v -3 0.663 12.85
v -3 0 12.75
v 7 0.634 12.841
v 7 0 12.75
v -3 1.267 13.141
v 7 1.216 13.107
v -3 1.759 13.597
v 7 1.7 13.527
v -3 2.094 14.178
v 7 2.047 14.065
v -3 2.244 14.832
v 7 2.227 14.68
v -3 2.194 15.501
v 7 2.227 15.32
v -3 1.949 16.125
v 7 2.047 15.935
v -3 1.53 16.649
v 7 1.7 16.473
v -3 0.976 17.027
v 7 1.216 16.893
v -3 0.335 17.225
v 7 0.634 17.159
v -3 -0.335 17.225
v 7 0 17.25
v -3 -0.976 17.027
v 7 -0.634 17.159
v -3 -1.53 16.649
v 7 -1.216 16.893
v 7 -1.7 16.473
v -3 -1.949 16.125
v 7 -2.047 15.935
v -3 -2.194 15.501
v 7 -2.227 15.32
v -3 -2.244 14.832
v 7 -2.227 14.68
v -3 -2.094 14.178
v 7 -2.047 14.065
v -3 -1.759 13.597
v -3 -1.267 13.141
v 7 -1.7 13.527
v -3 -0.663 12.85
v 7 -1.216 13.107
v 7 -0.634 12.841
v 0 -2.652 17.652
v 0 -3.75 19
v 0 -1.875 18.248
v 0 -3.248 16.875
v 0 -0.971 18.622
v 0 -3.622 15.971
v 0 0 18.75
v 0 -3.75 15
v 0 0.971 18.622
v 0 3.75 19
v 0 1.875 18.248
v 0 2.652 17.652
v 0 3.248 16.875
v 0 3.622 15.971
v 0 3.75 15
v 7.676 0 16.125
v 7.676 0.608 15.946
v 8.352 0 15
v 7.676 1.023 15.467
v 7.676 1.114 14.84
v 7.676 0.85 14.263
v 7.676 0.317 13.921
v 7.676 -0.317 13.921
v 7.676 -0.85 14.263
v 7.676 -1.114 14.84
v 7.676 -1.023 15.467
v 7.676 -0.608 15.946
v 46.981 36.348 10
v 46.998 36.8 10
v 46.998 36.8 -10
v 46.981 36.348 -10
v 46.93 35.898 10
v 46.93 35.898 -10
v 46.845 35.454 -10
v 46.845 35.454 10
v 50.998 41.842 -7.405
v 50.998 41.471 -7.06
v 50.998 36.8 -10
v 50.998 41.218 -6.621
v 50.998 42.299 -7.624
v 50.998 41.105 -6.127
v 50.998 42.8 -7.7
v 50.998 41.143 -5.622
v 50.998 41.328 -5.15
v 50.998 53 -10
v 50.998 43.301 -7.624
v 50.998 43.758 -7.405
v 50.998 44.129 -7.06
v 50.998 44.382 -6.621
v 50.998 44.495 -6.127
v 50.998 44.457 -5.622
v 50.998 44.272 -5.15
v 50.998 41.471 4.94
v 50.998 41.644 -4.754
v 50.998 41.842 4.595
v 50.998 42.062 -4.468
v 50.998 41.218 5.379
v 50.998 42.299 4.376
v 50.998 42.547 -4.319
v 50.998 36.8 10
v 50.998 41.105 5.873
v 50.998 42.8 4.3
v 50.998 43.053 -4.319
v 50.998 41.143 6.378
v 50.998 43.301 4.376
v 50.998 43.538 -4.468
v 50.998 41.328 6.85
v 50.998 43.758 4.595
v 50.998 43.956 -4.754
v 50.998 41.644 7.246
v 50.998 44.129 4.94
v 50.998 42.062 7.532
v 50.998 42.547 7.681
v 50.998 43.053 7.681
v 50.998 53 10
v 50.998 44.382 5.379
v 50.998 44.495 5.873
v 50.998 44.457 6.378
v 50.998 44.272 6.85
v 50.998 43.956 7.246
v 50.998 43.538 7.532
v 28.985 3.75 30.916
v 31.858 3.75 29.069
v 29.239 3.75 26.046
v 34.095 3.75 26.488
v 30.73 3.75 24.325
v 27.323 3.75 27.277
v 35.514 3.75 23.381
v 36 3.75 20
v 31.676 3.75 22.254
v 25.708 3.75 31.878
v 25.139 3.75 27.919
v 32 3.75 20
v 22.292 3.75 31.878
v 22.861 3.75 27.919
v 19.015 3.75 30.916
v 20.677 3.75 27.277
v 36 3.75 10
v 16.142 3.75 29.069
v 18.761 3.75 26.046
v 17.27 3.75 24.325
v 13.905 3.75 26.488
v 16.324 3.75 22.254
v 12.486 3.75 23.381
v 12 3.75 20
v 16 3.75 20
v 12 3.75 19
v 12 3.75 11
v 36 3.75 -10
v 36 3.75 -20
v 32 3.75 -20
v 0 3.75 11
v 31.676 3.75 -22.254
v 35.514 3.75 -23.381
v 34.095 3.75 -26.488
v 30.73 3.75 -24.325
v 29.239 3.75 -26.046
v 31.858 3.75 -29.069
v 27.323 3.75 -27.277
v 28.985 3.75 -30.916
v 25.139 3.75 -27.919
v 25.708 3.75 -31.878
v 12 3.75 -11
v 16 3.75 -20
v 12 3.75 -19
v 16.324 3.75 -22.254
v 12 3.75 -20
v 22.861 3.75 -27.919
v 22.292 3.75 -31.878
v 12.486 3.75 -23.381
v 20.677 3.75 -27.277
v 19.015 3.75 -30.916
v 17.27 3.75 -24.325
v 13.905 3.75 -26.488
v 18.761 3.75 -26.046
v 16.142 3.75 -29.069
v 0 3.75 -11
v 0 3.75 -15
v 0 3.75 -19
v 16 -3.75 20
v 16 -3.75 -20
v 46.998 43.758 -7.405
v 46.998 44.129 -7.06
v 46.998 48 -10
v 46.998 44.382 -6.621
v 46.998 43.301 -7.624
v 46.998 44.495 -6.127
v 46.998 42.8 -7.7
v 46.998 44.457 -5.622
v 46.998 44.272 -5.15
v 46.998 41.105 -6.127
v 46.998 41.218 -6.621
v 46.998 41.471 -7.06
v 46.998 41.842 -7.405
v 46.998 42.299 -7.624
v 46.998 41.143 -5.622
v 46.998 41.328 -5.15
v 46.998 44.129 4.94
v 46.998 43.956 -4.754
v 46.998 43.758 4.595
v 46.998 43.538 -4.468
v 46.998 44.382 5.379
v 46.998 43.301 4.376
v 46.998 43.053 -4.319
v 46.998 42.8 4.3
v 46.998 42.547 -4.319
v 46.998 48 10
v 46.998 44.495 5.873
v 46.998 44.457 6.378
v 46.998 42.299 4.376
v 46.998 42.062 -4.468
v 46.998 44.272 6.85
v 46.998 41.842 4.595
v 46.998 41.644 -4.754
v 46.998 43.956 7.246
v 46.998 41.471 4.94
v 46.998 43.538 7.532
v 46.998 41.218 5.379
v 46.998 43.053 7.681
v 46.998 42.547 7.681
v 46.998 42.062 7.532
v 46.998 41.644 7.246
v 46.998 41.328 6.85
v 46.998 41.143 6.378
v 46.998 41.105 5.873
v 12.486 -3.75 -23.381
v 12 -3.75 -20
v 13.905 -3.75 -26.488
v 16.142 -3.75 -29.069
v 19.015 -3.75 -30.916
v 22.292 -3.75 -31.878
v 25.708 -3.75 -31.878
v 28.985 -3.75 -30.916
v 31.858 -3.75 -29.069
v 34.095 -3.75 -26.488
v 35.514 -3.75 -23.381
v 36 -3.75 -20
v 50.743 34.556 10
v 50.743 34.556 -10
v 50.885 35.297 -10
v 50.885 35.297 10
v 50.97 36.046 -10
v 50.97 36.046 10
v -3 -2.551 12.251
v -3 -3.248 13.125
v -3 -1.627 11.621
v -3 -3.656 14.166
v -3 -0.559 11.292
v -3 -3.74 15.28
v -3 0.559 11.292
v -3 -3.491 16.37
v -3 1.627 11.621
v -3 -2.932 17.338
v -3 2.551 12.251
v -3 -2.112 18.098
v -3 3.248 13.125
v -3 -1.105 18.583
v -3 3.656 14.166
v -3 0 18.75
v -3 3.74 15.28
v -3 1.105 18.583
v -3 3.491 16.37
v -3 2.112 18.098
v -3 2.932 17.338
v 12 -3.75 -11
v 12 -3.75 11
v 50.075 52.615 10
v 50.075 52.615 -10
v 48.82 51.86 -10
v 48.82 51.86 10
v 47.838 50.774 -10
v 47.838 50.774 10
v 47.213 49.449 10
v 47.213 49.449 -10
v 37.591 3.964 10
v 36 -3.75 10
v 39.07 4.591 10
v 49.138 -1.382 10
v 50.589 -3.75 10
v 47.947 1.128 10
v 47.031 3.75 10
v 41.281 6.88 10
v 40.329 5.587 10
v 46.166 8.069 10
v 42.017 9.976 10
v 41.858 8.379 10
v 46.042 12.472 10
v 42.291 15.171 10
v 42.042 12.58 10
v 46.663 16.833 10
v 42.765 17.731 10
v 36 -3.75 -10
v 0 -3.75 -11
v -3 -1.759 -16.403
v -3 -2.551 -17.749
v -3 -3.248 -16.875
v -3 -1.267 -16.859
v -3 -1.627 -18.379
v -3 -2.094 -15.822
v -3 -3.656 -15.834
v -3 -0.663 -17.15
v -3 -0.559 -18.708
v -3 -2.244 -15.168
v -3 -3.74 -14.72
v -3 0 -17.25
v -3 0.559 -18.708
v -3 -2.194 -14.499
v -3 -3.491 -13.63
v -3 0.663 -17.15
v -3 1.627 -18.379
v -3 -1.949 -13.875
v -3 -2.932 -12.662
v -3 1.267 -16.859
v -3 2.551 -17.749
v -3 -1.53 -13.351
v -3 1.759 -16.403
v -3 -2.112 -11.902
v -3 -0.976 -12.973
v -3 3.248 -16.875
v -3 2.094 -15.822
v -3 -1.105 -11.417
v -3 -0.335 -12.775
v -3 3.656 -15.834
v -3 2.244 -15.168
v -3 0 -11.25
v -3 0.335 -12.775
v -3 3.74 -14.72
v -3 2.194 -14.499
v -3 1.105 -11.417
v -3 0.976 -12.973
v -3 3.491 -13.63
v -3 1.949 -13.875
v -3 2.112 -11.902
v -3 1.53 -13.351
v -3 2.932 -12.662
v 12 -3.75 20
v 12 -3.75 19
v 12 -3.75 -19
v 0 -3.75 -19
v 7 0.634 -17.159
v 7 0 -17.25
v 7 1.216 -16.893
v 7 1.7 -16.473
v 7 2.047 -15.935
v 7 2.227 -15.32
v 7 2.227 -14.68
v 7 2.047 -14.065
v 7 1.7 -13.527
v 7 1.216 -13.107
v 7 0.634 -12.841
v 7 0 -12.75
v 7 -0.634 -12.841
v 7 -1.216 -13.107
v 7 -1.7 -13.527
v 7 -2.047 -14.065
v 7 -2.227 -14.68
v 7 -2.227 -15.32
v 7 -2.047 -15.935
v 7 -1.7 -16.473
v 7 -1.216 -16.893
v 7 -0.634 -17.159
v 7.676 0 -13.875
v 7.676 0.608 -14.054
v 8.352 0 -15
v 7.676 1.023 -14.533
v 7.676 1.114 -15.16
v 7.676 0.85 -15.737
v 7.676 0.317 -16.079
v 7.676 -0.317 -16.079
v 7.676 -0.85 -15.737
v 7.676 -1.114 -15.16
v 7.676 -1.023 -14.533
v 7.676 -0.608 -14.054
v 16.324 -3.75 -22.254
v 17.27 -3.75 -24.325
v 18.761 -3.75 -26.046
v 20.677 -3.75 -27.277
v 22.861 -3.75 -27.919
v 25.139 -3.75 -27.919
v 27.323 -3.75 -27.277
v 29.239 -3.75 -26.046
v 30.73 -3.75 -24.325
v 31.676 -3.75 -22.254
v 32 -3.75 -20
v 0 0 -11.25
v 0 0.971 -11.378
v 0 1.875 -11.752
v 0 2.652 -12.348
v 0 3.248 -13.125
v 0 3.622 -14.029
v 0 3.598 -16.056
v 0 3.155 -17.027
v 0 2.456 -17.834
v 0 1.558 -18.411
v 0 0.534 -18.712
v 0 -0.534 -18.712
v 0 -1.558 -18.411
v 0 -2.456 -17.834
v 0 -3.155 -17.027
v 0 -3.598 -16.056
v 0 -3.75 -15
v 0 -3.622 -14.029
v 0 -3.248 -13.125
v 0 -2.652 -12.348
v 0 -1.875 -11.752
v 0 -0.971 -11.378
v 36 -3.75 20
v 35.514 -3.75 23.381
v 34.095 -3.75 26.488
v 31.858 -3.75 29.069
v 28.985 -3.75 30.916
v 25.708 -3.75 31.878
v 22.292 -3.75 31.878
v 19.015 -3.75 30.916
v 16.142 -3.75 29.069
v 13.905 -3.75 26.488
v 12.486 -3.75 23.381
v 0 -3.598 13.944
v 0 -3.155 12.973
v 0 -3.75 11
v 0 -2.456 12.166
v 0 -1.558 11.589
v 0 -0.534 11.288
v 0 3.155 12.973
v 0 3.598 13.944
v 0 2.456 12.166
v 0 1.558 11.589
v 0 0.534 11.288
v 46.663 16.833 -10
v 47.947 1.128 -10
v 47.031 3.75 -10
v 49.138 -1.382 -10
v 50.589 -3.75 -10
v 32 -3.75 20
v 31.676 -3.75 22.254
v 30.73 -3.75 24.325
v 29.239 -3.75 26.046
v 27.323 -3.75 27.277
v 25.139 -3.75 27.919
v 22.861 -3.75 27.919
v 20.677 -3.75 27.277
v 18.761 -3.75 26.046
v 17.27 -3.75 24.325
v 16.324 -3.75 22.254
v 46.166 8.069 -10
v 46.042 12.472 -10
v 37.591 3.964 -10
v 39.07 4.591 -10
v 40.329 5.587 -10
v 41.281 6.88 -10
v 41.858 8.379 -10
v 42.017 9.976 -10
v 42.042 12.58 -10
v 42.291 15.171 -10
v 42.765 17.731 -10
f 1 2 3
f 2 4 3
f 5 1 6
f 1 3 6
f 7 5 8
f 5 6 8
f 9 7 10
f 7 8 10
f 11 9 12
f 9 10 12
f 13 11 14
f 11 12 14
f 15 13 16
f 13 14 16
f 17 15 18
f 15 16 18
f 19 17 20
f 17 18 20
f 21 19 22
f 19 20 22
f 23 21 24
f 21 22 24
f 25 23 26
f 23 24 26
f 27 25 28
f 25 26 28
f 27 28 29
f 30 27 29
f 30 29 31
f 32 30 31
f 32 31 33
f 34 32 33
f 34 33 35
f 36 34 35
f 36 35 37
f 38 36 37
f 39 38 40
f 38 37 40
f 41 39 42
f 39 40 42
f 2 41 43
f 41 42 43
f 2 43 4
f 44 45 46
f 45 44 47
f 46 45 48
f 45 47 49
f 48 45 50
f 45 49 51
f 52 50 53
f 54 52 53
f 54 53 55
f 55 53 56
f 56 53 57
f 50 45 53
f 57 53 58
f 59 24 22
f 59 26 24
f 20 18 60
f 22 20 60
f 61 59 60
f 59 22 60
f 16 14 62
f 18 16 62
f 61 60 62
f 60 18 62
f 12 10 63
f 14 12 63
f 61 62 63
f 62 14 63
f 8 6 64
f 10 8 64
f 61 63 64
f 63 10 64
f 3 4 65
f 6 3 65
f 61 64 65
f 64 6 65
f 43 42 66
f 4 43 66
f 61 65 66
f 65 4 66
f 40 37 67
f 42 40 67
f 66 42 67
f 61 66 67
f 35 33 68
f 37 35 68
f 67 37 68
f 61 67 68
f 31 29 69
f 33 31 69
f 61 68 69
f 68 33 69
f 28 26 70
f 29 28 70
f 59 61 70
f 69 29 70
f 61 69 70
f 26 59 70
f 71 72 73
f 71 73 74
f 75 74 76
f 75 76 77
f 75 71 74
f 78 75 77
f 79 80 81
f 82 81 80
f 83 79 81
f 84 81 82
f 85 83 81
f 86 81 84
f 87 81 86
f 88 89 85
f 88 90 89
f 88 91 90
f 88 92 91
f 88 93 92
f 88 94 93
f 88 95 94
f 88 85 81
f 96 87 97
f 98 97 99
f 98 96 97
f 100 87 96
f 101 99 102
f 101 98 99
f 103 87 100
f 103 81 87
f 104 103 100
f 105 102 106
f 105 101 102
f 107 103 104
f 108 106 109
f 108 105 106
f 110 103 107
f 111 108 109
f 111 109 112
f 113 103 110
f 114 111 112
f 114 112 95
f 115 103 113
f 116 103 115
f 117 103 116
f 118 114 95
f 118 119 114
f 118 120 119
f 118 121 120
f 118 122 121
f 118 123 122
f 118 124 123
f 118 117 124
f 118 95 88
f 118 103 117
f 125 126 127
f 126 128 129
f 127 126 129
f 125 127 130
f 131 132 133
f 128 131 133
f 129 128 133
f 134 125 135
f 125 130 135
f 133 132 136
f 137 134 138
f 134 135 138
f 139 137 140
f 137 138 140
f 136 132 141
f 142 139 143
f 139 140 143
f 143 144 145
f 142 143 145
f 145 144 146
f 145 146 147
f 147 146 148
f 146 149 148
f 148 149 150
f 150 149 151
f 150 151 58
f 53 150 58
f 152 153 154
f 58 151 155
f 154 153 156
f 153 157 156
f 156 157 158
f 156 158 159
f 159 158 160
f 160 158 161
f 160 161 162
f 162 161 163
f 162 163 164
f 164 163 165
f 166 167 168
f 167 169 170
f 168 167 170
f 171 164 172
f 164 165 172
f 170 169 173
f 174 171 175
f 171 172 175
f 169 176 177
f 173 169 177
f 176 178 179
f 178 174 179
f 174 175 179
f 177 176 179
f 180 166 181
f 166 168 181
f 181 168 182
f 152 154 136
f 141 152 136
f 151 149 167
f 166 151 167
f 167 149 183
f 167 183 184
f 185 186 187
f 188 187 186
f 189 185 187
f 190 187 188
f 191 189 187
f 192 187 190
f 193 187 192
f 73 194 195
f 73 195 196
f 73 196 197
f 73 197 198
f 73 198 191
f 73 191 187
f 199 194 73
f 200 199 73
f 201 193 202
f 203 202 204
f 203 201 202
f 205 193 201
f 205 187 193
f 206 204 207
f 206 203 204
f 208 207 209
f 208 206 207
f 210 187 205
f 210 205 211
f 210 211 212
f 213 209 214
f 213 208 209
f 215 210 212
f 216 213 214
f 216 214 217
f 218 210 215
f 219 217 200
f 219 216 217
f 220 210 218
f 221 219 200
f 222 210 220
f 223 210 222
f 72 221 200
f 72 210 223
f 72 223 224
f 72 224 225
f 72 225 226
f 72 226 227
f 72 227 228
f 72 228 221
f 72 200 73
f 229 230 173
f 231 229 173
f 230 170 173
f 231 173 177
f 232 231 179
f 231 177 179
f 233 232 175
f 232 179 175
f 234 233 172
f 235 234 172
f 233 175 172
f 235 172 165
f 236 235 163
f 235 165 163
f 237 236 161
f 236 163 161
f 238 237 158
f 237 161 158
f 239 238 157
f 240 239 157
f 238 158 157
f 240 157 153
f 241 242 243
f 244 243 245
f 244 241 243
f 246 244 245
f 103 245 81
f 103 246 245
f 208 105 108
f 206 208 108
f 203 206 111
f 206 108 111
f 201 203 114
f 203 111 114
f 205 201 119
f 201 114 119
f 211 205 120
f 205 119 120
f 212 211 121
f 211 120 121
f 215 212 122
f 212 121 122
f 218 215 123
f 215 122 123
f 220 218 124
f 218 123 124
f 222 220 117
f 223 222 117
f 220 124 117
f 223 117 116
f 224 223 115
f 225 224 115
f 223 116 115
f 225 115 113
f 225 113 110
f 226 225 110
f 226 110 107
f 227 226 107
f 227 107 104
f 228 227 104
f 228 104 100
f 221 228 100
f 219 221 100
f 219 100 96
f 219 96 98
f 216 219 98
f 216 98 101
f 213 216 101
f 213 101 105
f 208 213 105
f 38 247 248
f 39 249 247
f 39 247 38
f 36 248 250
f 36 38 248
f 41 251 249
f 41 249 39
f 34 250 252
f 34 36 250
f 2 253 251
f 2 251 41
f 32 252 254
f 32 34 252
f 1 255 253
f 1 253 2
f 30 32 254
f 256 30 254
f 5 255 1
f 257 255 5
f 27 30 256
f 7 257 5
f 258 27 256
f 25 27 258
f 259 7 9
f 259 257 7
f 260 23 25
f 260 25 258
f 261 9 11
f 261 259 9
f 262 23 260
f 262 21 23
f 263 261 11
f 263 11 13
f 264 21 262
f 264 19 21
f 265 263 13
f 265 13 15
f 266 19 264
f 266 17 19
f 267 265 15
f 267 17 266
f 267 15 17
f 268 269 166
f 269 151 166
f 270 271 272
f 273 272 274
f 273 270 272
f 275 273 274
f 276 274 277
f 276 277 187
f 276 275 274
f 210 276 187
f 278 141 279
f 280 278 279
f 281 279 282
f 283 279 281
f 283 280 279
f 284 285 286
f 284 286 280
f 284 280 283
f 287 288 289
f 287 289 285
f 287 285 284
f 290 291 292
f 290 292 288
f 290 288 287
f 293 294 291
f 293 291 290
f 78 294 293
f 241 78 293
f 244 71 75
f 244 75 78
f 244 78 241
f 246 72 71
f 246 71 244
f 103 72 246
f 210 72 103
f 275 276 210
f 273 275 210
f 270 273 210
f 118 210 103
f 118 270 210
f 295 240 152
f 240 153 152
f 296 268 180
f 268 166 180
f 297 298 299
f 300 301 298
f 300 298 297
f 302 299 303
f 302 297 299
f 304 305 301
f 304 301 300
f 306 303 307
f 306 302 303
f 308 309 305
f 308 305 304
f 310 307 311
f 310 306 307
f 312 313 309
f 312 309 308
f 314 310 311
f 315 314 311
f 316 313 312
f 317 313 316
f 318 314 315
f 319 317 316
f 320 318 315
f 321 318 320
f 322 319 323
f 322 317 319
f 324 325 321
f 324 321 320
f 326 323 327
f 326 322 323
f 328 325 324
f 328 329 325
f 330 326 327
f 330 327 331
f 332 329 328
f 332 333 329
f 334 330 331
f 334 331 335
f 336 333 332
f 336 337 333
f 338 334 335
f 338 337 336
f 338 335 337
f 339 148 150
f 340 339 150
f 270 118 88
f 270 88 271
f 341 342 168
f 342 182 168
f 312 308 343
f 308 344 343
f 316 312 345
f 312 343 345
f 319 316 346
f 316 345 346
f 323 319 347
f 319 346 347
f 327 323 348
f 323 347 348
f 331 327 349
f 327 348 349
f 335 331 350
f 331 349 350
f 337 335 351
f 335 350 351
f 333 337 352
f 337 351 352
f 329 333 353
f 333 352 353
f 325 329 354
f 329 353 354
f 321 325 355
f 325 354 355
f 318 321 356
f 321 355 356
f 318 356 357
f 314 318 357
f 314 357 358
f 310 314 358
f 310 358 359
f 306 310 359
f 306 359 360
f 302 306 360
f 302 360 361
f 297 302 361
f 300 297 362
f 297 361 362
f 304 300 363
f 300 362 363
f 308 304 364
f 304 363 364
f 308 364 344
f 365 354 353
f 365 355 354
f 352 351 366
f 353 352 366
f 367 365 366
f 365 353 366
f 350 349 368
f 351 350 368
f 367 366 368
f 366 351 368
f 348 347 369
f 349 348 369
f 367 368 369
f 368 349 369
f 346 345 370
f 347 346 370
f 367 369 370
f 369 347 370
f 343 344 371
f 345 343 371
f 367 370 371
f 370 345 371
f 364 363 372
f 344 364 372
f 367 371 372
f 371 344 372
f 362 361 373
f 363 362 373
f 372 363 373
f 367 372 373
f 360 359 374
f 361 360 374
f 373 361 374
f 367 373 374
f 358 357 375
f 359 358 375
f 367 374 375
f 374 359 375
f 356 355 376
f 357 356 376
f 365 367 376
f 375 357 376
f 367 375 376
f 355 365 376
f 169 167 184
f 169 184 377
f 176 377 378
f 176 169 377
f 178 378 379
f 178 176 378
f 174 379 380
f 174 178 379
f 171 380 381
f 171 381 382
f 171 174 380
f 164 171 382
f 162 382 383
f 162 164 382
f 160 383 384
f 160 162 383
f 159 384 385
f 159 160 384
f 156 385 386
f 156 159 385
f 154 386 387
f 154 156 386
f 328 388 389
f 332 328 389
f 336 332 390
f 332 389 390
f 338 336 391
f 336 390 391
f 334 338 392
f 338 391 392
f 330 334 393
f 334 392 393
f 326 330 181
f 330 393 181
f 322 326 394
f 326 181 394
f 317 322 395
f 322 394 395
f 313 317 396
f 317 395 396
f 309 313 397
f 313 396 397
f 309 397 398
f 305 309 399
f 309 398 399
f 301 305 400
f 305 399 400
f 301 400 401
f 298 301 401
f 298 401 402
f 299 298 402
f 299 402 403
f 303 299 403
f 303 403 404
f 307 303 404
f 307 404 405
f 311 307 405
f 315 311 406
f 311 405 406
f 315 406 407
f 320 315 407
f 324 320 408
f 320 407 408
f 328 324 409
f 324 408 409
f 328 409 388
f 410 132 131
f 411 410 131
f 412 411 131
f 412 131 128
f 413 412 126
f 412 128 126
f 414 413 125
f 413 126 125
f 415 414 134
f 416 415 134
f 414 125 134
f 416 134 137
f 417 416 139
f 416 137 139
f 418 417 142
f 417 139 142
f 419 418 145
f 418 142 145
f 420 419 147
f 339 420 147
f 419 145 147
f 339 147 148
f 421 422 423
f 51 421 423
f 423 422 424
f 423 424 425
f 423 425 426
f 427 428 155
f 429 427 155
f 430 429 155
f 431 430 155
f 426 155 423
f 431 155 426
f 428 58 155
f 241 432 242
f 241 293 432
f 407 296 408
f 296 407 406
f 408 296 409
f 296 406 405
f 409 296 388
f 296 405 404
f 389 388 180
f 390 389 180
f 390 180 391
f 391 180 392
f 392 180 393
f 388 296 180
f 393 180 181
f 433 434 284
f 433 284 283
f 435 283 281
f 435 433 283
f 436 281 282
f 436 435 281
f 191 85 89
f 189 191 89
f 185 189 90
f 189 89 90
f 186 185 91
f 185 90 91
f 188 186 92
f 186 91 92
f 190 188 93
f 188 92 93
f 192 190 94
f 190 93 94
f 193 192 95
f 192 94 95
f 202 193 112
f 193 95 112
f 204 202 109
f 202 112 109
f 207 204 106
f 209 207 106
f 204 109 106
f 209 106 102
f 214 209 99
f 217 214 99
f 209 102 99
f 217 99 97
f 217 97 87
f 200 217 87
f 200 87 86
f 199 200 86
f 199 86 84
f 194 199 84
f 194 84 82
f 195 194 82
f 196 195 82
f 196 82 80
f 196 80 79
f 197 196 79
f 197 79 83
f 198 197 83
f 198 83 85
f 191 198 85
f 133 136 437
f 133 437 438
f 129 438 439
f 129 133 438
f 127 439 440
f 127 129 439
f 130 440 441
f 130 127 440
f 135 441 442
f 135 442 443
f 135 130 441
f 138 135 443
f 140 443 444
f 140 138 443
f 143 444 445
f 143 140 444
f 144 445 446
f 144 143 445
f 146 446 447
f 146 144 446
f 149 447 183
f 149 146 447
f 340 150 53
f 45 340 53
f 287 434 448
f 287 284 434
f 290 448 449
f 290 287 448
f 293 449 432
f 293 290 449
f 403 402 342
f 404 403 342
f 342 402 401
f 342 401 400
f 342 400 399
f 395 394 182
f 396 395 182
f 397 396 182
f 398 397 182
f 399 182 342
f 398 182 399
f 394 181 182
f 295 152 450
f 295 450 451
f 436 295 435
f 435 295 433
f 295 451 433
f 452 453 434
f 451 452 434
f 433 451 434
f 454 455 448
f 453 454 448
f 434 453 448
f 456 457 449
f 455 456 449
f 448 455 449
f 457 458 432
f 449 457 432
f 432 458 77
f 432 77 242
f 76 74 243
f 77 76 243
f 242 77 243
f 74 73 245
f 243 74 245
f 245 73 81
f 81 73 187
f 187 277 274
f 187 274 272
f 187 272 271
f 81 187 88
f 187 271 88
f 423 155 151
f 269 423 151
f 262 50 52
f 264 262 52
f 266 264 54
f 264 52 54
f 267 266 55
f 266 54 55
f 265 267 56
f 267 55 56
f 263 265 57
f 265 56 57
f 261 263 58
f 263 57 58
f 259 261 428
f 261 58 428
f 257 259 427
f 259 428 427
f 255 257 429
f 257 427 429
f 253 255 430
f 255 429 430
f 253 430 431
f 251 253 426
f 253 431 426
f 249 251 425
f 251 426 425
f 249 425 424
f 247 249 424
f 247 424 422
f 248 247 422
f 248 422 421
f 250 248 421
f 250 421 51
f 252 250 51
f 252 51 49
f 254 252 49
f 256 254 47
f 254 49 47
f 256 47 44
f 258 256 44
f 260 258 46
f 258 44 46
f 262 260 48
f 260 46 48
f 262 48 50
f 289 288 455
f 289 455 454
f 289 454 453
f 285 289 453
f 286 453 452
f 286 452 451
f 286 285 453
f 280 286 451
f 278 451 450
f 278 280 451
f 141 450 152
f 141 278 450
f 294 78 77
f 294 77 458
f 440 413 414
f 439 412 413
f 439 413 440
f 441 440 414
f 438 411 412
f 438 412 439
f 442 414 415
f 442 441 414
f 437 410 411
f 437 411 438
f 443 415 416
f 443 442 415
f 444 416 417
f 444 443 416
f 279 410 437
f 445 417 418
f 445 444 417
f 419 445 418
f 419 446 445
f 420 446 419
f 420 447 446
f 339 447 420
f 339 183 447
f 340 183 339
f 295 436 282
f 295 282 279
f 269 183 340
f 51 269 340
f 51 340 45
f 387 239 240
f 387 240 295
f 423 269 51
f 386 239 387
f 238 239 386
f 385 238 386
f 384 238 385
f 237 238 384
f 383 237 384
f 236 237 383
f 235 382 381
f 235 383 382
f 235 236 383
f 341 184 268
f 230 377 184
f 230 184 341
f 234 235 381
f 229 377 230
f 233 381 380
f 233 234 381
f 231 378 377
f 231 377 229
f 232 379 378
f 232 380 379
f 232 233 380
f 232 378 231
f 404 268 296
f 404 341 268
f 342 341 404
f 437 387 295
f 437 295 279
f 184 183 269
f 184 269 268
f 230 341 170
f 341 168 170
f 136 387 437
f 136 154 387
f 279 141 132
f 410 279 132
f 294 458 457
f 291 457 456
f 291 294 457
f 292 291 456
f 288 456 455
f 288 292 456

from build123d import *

# Parameters (mm, degrees)
BOSS_EXTRUDE1_DEPTH      = 3.75
SKETCH2_R                = 3.75
BOSS_EXTRUDE2_DEPTH      = 3
M4_CLEARANCE_HOLE1_D     = 4.5
M4_CLEARANCE_HOLE1_DEPTH = 10
M4_CLEARANCE_HOLE1_TIP   = 1.351936393
CUT_EXTRUDE1_DEPTH       = 33
CUT_EXTRUDE1_DEPTH_BACK  = 33
BOSS_EXTRUDE3_DEPTH      = 10
M3_CLEARANCE_HOLE1_D     = 3.4
M3_CLEARANCE_HOLE1_DEPTH = 10
M3_CLEARANCE_HOLE1_TIP   = 1.021463052


with BuildPart() as part:
    # Sketch1 → Boss-Extrude1 (new body, symmetric)
    with BuildSketch(Plane(origin=(0, 0, 0), x_dir=(1, 0, 0), z_dir=(0, 1, 0))):
        with BuildLine():
            Line((0, -11), (12, -11))
            Line((12, -11), (12, 11))
            Line((12, 11), (0, 11))
            Line((0, 11), (0, 19))
            Line((0, 19), (12, 19))
            Line((12, 19), (12, 20))
            ThreePointArc((12, 20), (24, 32), (36, 20))
            Line((36, 20), (36, 10))
            Line((36, 10), (55, 10))
            Line((55, 10), (55, -10))
            Line((55, -10), (36, -10))
            Line((36, -10), (36, -20))
            ThreePointArc((36, -20), (24, -32), (12, -20))
            Line((12, -20), (12, -19))
            Line((12, -19), (0, -19))
            Line((0, -19), (0, -11))
        make_face()
        with BuildLine():
            Line((32, 20), (32, -20))
            ThreePointArc((32, -20), (24, -28), (16, -20))
            Line((16, -20), (16, 20))
            ThreePointArc((16, 20), (24, 28), (32, 20))
        make_face(mode=Mode.SUBTRACT)
    extrude(amount=BOSS_EXTRUDE1_DEPTH, both=True)

    # Sketch2 → Boss-Extrude2 (add)
    with BuildSketch(Plane.ZY):
        with Locations((-15, 0)):
            Circle(SKETCH2_R)
        with Locations((15, 0)):
            Circle(SKETCH2_R)
    extrude(amount=BOSS_EXTRUDE2_DEPTH)

    # M4 Clearance Hole1
    with Locations(Plane.ZY.offset(3)):
        with Locations((-15, 0), (15, 0)):
            Hole(M4_CLEARANCE_HOLE1_D / 2, depth=M4_CLEARANCE_HOLE1_DEPTH)
            with Locations((0, 0, -(M4_CLEARANCE_HOLE1_DEPTH + M4_CLEARANCE_HOLE1_TIP / 2))):  # 118° drill point
                Cone(0, M4_CLEARANCE_HOLE1_D / 2, M4_CLEARANCE_HOLE1_TIP, mode=Mode.SUBTRACT)

    # Sketch6 → Cut-Extrude1 (cut, two sides)
    with BuildSketch(Plane.XY) as cut_extrude1_sk:
        with BuildLine():
            Line((53.548387097, -7.31769585), (58.512723929, -6.476790348))
            Line((58.512723929, -6.476790348), (58.512723929, 16.833295116))
            Line((58.512723929, 16.833295116), (46.662820439, 16.833295116))
            ThreePointArc((46.662820439, 16.833295116), (46.996356715, 3.87133796), (53.548387097, -7.31769585))
        make_face()
    extrude(amount=CUT_EXTRUDE1_DEPTH, mode=Mode.SUBTRACT)
    extrude(cut_extrude1_sk.sketch, amount=-CUT_EXTRUDE1_DEPTH_BACK, mode=Mode.SUBTRACT)

    # Sketch7 → Boss-Extrude3 (add, symmetric)
    with BuildSketch(Plane.XY):
        with BuildLine():
            Line((46.662820439, 16.833295116), (50.743158051, 34.556424956))
            ThreePointArc((50.743158051, 34.556424956), (50.934151856, 35.670993937), (50.998088989, 36.8))
            Line((50.998088989, 36.8), (50.998088989, 53))
            Line((50.998088989, 53), (50.075012066, 52.615384615))
            ThreePointArc((50.075012066, 52.615384615), (47.837837517, 50.773500981), (46.998088989, 48))
            Line((46.998088989, 48), (46.998088989, 36.8))
            ThreePointArc((46.998088989, 36.8), (46.959726709, 36.122596362), (46.845130426, 35.453854973))
            Line((46.845130426, 35.453854973), (42.764792814, 17.730725133))
            ThreePointArc((42.764792814, 17.730725133), (42.138360124, 13.877927021), (42.017467452, 9.976407294))
            ThreePointArc((42.017467452, 9.976407294), (40.329493687, 5.586764491), (36, 3.75))
            Line((36, 3.75), (47.031269556, 3.75))
            ThreePointArc((47.031269556, 3.75), (46.010304001, 10.268083427), (46.662820439, 16.833295116))
        make_face()
    extrude(amount=BOSS_EXTRUDE3_DEPTH, both=True)

    # M3 Clearance Hole1
    with Locations(Plane.ZY.offset(-46.998088989)):
        with Locations((-6, 42.8), (6, 42.8)):
            Hole(M3_CLEARANCE_HOLE1_D / 2, depth=M3_CLEARANCE_HOLE1_DEPTH)
            with Locations((0, 0, -(M3_CLEARANCE_HOLE1_DEPTH + M3_CLEARANCE_HOLE1_TIP / 2))):  # 118° drill point
                Cone(0, M3_CLEARANCE_HOLE1_D / 2, M3_CLEARANCE_HOLE1_TIP, mode=Mode.SUBTRACT)


solid = part.part
